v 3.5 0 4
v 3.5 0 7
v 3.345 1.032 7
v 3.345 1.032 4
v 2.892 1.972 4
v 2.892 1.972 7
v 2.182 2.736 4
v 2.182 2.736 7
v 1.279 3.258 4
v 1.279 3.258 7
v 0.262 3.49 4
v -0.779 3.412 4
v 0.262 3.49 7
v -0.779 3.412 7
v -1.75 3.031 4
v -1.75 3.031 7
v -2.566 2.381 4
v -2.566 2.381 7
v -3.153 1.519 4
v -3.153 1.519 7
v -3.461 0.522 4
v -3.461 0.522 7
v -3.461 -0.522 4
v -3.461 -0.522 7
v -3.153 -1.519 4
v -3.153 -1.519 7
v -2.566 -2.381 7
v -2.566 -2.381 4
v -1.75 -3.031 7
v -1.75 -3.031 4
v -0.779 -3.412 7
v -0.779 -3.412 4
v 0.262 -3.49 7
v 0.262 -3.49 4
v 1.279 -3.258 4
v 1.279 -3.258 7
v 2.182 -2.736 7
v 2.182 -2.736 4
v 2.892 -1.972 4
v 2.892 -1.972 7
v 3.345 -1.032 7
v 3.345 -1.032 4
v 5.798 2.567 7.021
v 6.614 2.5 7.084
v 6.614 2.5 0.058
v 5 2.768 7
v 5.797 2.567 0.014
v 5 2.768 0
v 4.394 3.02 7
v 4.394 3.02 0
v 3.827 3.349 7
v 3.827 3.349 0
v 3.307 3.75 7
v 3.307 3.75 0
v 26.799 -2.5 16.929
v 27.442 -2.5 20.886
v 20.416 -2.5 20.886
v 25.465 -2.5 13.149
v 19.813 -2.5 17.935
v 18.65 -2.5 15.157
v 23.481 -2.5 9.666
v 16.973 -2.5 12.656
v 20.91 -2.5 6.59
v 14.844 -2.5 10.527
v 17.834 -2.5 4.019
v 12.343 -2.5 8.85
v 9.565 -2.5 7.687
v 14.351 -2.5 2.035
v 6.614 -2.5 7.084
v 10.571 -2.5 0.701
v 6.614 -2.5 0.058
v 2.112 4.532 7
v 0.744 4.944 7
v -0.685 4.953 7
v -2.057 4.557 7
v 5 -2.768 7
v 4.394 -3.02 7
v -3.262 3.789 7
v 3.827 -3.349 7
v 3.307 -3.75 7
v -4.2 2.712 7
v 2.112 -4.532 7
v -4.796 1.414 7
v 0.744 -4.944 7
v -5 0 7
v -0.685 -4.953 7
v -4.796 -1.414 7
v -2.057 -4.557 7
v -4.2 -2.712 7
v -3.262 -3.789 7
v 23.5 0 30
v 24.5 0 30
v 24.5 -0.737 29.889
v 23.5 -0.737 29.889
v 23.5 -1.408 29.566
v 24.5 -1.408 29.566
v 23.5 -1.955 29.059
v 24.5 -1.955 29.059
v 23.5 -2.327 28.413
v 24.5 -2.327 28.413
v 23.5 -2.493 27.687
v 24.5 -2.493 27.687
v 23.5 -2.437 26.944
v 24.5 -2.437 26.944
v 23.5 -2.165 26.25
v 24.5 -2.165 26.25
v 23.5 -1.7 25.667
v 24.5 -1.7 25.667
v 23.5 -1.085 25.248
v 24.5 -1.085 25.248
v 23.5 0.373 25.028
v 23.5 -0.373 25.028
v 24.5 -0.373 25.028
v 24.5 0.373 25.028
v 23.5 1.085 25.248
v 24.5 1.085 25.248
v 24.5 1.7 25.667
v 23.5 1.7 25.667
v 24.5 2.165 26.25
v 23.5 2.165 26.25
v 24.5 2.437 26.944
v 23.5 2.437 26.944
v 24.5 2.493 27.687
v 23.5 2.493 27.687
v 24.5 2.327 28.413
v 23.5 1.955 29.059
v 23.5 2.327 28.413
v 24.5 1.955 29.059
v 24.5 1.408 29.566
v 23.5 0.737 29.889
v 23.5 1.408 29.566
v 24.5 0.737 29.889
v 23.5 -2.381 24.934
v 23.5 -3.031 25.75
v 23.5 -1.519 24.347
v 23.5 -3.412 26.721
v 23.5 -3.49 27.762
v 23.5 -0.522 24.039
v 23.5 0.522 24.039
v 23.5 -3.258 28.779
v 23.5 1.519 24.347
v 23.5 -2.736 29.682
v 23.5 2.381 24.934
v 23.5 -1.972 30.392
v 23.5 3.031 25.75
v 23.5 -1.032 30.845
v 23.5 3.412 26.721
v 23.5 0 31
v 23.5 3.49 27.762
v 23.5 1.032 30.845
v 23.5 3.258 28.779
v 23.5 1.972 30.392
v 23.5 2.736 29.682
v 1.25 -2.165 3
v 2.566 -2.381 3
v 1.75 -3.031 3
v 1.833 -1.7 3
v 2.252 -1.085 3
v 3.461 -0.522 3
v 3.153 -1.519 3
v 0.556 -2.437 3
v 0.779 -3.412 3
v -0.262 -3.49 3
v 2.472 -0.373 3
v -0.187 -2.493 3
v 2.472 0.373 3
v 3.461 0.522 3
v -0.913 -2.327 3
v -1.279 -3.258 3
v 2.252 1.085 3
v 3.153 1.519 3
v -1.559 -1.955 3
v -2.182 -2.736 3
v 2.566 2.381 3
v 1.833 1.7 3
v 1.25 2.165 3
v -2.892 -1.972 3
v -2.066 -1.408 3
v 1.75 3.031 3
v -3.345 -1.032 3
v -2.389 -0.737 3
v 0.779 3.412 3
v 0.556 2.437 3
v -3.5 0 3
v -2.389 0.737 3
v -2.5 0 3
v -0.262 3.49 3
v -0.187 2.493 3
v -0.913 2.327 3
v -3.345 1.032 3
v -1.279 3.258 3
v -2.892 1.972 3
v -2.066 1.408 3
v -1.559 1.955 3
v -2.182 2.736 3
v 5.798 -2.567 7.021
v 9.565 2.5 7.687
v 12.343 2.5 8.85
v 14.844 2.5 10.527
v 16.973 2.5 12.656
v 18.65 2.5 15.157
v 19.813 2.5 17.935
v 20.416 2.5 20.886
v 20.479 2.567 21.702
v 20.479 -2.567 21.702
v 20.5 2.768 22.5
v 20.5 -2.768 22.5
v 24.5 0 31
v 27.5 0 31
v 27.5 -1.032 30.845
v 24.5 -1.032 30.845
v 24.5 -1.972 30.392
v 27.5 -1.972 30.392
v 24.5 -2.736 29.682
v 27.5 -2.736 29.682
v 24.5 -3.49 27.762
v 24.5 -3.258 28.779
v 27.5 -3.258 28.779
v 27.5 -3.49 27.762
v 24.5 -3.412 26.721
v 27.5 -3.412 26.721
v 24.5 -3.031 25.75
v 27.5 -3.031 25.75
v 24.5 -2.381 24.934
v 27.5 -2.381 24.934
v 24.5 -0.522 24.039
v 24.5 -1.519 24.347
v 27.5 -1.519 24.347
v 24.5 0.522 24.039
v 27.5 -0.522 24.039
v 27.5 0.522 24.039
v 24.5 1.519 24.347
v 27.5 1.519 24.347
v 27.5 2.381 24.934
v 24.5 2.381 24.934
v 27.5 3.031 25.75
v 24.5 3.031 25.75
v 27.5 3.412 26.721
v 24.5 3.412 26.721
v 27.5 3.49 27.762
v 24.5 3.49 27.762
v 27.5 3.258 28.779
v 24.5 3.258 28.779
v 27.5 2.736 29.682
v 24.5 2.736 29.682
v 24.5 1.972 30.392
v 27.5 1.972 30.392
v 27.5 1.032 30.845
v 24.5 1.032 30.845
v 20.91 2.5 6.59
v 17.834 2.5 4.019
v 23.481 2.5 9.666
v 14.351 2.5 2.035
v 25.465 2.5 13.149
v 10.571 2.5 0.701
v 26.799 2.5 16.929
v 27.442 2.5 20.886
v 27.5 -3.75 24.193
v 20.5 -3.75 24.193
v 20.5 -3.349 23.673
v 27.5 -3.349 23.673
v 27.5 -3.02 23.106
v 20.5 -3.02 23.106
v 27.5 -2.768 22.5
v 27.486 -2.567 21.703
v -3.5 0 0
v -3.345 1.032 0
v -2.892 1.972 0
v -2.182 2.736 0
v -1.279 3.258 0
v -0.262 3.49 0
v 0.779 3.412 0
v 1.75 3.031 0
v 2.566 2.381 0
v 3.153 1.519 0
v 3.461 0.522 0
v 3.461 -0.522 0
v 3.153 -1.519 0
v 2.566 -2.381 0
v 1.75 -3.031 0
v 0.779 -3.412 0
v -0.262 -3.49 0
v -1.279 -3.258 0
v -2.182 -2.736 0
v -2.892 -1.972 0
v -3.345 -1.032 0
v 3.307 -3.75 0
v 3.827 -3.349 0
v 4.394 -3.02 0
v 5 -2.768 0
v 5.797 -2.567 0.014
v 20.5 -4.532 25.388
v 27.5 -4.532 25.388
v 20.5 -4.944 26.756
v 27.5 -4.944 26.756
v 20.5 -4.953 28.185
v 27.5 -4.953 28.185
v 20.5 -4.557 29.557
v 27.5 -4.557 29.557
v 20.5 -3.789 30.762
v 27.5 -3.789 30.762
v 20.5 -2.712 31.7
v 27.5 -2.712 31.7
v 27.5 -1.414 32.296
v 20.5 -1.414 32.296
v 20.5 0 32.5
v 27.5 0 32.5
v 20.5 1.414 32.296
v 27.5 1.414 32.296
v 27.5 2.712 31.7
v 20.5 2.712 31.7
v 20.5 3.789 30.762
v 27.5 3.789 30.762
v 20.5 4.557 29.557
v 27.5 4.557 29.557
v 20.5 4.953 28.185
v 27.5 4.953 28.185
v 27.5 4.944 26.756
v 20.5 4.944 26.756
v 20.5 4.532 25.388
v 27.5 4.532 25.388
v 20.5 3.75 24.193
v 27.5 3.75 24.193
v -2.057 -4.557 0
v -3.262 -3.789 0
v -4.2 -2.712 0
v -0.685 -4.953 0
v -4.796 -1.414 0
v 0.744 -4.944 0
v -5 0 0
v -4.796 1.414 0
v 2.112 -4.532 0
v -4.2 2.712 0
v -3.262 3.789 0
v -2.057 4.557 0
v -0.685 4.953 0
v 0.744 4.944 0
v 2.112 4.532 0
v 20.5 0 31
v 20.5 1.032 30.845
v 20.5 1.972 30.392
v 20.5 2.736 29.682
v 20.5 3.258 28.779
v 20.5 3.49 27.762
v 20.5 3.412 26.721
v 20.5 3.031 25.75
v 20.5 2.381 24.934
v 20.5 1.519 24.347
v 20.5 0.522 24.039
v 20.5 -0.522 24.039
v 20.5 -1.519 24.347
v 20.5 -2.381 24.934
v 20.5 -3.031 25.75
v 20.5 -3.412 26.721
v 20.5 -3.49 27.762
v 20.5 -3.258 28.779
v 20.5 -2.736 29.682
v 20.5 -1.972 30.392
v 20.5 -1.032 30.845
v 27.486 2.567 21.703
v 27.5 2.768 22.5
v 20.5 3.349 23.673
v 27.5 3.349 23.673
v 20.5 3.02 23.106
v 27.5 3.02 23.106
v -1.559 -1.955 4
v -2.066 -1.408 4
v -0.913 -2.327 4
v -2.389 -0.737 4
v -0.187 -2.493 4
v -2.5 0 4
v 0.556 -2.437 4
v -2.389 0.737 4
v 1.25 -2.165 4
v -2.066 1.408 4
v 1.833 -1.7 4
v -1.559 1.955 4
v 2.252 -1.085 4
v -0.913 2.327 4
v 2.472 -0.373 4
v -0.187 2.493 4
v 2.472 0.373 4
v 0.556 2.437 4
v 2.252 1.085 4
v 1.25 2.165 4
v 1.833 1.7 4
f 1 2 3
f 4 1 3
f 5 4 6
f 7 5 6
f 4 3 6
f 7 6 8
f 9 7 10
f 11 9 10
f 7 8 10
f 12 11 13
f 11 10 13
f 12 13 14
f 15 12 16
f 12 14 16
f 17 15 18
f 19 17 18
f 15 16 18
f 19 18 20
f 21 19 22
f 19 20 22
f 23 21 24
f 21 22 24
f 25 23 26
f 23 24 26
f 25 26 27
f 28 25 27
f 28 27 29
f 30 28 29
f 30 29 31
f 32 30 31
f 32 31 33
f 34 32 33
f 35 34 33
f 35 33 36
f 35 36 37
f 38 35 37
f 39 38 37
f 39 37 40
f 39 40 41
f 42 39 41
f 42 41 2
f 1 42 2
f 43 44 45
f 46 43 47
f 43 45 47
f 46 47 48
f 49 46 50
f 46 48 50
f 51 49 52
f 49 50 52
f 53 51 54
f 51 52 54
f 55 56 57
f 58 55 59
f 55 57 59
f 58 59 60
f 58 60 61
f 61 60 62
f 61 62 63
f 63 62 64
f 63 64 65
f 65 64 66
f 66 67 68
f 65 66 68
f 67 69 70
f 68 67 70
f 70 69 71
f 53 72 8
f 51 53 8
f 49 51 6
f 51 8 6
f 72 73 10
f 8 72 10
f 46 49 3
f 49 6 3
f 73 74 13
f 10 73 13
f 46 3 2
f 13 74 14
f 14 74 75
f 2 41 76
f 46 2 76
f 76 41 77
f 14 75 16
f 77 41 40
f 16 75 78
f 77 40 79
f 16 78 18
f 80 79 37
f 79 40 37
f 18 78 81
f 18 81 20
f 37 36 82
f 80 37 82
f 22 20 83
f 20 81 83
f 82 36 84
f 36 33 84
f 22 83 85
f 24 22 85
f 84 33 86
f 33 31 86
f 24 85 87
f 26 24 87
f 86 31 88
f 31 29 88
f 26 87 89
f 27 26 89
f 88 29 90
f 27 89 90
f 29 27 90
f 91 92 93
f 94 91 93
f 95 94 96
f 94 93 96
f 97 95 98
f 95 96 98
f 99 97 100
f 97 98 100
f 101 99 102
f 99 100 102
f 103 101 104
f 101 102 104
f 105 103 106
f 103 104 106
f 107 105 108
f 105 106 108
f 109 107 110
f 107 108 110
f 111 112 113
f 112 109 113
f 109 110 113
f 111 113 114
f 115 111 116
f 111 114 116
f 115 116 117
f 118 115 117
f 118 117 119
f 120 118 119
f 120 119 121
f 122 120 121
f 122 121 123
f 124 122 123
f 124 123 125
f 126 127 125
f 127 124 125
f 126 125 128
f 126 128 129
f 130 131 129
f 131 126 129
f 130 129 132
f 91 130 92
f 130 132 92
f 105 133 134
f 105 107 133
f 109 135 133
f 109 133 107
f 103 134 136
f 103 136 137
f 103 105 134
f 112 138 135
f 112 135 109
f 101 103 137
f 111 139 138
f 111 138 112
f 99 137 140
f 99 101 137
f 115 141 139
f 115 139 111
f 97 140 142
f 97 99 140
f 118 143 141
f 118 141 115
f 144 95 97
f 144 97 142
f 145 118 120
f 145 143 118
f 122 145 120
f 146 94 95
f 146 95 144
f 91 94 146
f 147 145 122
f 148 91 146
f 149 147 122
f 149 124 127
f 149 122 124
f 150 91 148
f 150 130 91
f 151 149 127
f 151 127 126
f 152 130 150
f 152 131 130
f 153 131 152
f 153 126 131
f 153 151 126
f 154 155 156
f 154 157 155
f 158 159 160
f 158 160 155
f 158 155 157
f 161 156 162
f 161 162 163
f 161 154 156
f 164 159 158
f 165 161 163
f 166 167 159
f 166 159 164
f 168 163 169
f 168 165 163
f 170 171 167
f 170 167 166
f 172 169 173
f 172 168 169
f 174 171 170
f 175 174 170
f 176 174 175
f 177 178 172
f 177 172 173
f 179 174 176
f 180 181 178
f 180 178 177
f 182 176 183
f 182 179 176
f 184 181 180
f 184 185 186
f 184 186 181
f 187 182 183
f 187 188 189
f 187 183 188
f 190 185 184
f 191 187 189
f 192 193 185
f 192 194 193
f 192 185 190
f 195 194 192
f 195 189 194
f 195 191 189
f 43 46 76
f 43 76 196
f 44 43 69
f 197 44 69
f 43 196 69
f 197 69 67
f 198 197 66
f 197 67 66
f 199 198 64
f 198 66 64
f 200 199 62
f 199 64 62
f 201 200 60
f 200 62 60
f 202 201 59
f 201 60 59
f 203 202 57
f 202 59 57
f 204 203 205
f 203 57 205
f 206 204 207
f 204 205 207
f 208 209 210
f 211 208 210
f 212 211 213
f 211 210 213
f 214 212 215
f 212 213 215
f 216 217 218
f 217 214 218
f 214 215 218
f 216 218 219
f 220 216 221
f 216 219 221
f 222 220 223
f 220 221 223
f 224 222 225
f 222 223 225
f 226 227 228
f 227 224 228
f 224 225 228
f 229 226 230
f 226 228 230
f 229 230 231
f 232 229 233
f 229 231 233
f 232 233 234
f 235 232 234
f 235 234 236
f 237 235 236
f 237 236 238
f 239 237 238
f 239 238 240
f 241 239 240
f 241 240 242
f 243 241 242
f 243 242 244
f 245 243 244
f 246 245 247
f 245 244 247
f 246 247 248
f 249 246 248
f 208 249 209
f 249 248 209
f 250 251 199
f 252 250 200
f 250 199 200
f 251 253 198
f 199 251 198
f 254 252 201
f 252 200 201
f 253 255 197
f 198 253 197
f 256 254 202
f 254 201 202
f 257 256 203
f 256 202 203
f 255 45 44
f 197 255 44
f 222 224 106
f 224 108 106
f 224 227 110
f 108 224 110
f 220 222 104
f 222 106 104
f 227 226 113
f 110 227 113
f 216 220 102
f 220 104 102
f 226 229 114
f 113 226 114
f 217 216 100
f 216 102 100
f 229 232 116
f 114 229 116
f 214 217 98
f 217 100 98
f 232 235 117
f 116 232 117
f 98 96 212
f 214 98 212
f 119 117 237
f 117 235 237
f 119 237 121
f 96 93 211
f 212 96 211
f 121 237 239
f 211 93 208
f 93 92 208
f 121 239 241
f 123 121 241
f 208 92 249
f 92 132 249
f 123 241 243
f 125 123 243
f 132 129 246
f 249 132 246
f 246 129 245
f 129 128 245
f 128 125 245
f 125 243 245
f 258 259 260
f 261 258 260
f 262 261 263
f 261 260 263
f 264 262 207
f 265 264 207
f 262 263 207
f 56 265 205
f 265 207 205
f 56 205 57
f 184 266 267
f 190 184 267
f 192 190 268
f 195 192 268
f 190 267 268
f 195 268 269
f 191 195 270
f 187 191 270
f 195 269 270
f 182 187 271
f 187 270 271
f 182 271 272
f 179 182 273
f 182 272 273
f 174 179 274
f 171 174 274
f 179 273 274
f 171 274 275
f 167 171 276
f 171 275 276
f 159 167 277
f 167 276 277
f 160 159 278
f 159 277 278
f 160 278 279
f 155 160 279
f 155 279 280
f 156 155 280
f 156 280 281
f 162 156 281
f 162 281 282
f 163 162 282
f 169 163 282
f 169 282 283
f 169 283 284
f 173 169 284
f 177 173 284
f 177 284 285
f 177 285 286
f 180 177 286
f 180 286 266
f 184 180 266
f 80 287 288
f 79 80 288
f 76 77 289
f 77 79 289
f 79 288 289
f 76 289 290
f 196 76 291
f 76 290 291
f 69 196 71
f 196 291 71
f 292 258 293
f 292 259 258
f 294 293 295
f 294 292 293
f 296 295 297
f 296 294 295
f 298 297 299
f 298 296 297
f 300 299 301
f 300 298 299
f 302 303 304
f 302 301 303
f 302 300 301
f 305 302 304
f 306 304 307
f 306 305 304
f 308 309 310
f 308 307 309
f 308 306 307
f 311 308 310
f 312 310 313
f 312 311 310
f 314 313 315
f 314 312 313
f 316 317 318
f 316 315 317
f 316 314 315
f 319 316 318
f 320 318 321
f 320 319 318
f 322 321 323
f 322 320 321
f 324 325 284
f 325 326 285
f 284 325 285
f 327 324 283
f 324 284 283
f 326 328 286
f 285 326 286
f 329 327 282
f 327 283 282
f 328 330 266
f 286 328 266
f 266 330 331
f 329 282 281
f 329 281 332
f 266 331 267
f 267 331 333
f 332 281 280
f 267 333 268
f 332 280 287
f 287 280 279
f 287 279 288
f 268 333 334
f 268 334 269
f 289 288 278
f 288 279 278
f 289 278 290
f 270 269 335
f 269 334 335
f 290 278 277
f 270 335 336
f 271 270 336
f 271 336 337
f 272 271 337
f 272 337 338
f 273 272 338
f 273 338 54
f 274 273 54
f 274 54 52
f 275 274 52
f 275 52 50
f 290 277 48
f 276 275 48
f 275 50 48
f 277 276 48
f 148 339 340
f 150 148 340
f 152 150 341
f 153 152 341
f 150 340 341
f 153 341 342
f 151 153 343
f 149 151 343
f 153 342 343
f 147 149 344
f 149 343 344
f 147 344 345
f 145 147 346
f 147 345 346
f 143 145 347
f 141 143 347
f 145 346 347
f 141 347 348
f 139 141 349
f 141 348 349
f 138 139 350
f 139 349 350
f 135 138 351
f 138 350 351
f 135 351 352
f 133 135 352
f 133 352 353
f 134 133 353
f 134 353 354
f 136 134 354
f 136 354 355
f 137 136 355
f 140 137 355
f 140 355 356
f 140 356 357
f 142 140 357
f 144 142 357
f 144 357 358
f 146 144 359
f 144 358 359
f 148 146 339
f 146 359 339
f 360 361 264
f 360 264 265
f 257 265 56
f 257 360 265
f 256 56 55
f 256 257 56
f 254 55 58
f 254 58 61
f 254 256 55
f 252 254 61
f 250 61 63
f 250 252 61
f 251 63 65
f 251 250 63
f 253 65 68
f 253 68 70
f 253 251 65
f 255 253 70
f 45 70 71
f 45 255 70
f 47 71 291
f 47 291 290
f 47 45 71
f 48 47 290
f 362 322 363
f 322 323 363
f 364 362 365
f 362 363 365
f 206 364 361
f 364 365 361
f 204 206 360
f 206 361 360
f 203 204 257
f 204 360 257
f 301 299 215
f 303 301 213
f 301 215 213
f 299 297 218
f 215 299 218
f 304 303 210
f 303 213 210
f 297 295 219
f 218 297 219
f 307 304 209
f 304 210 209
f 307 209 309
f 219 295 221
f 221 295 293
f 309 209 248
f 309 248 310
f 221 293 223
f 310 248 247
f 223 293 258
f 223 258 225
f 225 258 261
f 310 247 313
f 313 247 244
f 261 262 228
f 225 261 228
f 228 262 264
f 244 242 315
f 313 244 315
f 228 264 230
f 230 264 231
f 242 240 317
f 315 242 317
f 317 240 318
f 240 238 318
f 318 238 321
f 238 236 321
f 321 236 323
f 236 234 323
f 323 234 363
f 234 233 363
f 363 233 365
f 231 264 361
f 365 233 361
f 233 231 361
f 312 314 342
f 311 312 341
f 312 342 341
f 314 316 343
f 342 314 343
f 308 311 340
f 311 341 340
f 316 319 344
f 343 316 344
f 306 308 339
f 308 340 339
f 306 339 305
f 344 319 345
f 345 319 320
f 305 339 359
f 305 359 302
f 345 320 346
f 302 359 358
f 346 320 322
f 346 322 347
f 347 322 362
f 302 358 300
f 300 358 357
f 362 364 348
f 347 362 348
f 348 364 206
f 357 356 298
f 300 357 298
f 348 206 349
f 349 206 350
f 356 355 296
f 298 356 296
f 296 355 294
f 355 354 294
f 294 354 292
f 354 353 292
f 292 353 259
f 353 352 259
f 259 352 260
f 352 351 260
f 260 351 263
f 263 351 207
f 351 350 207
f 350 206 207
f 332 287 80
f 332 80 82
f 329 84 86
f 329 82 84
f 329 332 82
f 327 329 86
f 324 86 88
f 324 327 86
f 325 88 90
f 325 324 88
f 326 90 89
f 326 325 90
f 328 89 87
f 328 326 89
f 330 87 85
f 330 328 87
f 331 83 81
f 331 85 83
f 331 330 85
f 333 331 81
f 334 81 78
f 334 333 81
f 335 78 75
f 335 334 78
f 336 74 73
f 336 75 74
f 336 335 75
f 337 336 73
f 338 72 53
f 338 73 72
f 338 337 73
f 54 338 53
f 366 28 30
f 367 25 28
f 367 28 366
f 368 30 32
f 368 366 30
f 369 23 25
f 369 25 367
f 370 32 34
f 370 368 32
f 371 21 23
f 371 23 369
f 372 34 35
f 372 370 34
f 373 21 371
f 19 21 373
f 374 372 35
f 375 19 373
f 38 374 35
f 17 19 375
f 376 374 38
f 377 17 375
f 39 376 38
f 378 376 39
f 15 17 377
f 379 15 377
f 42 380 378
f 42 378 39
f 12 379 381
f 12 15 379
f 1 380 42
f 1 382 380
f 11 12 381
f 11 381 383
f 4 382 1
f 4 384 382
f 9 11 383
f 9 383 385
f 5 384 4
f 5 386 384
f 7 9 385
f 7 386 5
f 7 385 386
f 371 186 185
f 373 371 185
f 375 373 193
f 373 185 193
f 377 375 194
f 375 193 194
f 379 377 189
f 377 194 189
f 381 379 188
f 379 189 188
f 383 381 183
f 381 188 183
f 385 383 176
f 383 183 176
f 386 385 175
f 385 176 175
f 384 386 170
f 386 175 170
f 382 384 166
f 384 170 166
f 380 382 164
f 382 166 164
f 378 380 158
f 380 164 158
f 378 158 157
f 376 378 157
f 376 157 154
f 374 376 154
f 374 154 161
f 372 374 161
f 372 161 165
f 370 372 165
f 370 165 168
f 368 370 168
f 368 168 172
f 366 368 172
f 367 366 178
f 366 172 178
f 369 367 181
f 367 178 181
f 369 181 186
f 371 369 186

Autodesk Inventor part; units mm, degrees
ref_plane "XZ Plane" through (0, 0, 0) normal (0, 1, 0) x (-1, 0, 0)
ref_plane "XY Plane" through (0, 0, 0) normal (0, 0, 1) x (1, 0, 0)
sketch "Sketch1" plane through (0, 0, 0) normal (0, 0, 1) x (1, 0, 0)
  circle A0 centre (0, 0) radius 5
  dimension "d0" = 10
extrude "Extrusion1" add sketch "Sketch1" along normal blind 7
sketch "Sketch2" plane through (0, 0, 0) normal (1, 0, 0) x (0, 1, 0)
  line L0 (-2.5, 7) -> (2.5, 7)
  line L1 (2.5, 7) -> (2.5, 0)
  line L2 (2.5, 0) -> (-2.5, 0)
  line L3 (-2.5, 0) -> (-2.5, 7)
  line L4 (-2.5, 7) -> (2.5, 0) construction
  line L5 (2.5, 7) -> (-2.5, 0) construction
  line L6 (-5, 0) -> (5, 0) projected
  point P0 (0, 0)
  point P1 (0, 3.5)
  dimension "d3" = 3.5
  dimension "d4" = 0
  dimension "d5" = 7
  dimension "d6" = 5
sketch "Sketch3" plane through (0, 0, 0) normal (0, 1, 0) x (-1, 0, 0)
  arc A0 (-25, 22.5) -> (-5, 2.5) centre (-5, 22.5) ccw
  line L0 (-5, 2.5) -> (0, 2.5)
  line L1 (-25, 22.5) -> (-25, 27.5)
  point P0 (0, 0)
  dimension "d14" = 2.5
  dimension "d15" = 5
  dimension "d17" = 5
  dimension "d24" = 5
  dimension "d55" = 20
  dimension "d56" = 0
  dimension "d57" = 20
sweep "Sweep1" add profiles "Sketch2" path "Sketch3"
ref_plane "Work Plane1" through (24, 0, 0) normal (1, 0, 0) x (0, 1, 0)
sketch "Sketch4" plane through (24, 0, 0) normal (1, 0, 0) x (0, 1, 0)
  circle A0 centre (0, 27.5) radius 5
  point P0 (0, 0)
  dimension "d27" = 10
  dimension "d28" = 27.5
  dimension "d29" = 0
extrude "Extrusion2" add sketch "Sketch4" along normal mid plane 7
sketch "Sketch6" plane through (27.5, -2.5, 22.5) normal (-1, 0, 0) x (0, 0, 1)
  circle A0 centre (5, 2.5) radius 3.5
  point P0 (-22.5, 2.5)
  dimension "d32" = 7
  dimension "d33" = 27.5
  dimension "d34" = 0
extrude "Extrusion4" cut sketch "Sketch6" along normal blind 3
sketch "Sketch7" plane through (24.5, 0, 27.5) normal (-1, 0, 0) x (0, 0, 1)
  circle A0 centre (0, 0) radius 2.5
  line L0 (-27.5, 5) -> (-27.5, -5) projected
  point P0 (-27.5, 0)
  point P1 (-27.5, -2.5)
  point P2 (-27.5, 2.5)
  dimension "d37" = 5
  dimension "d38" = 27.5
  dimension "d39" = 0
extrude "Extrusion5" cut sketch "Sketch7" along normal up to next
sketch "Sketch8" plane through (0, 0, 0) normal (0, 0, -1) x (-1, 0, 0)
  circle A0 centre (0, 0) radius 3.5
  dimension "d42" = 7
extrude "Extrusion6" cut sketch "Sketch8" against normal blind 3
sketch "Sketch9" plane through (0, 0, 3) normal (0, 0, -1) x (-1, 0, 0)
  circle A0 centre (0, 0) radius 2.5
  dimension "d45" = 5
extrude "Extrusion7" cut sketch "Sketch9" against normal up to next
fillet "Fillet1" radius 5 4 edges at (24, -2.5, 23.1699) (24, 2.5, 23.1699) (4.3301, -2.5, 3.5) (4.3301, 2.5, 3.5)
sketch "Sketch10" plane through (20.5, 0, 27.5) normal (-1, 0, 0) x (0, 0, 1)
  circle A0 centre (0, 0) radius 3.5
  circle A1 centre (0, 0) radius 2.5 projected
  point P0 (-27.5, 0)
  dimension "d49" = 7
extrude "Extrusion8" cut sketch "Sketch10" against normal blind 3
sketch "Sketch11" plane through (0, 0, 7) normal (0, 0, 1) x (1, 0, 0)
  circle A0 centre (0, 0) radius 3.5
  circle A1 centre (0, 0) radius 2.5 projected
  dimension "d52" = 7
extrude "Extrusion9" cut sketch "Sketch11" against normal blind 3
equation "\"d3\" = 0.5 * d5"
equation "\"d55\" = width"
equation "\"d57\" = height"
equation "\"d33\" = d28"
equation "\"d38\" = d28"
equation "\"width\" = 20"
equation "\"height\" = 20"
properties part number "Link"
